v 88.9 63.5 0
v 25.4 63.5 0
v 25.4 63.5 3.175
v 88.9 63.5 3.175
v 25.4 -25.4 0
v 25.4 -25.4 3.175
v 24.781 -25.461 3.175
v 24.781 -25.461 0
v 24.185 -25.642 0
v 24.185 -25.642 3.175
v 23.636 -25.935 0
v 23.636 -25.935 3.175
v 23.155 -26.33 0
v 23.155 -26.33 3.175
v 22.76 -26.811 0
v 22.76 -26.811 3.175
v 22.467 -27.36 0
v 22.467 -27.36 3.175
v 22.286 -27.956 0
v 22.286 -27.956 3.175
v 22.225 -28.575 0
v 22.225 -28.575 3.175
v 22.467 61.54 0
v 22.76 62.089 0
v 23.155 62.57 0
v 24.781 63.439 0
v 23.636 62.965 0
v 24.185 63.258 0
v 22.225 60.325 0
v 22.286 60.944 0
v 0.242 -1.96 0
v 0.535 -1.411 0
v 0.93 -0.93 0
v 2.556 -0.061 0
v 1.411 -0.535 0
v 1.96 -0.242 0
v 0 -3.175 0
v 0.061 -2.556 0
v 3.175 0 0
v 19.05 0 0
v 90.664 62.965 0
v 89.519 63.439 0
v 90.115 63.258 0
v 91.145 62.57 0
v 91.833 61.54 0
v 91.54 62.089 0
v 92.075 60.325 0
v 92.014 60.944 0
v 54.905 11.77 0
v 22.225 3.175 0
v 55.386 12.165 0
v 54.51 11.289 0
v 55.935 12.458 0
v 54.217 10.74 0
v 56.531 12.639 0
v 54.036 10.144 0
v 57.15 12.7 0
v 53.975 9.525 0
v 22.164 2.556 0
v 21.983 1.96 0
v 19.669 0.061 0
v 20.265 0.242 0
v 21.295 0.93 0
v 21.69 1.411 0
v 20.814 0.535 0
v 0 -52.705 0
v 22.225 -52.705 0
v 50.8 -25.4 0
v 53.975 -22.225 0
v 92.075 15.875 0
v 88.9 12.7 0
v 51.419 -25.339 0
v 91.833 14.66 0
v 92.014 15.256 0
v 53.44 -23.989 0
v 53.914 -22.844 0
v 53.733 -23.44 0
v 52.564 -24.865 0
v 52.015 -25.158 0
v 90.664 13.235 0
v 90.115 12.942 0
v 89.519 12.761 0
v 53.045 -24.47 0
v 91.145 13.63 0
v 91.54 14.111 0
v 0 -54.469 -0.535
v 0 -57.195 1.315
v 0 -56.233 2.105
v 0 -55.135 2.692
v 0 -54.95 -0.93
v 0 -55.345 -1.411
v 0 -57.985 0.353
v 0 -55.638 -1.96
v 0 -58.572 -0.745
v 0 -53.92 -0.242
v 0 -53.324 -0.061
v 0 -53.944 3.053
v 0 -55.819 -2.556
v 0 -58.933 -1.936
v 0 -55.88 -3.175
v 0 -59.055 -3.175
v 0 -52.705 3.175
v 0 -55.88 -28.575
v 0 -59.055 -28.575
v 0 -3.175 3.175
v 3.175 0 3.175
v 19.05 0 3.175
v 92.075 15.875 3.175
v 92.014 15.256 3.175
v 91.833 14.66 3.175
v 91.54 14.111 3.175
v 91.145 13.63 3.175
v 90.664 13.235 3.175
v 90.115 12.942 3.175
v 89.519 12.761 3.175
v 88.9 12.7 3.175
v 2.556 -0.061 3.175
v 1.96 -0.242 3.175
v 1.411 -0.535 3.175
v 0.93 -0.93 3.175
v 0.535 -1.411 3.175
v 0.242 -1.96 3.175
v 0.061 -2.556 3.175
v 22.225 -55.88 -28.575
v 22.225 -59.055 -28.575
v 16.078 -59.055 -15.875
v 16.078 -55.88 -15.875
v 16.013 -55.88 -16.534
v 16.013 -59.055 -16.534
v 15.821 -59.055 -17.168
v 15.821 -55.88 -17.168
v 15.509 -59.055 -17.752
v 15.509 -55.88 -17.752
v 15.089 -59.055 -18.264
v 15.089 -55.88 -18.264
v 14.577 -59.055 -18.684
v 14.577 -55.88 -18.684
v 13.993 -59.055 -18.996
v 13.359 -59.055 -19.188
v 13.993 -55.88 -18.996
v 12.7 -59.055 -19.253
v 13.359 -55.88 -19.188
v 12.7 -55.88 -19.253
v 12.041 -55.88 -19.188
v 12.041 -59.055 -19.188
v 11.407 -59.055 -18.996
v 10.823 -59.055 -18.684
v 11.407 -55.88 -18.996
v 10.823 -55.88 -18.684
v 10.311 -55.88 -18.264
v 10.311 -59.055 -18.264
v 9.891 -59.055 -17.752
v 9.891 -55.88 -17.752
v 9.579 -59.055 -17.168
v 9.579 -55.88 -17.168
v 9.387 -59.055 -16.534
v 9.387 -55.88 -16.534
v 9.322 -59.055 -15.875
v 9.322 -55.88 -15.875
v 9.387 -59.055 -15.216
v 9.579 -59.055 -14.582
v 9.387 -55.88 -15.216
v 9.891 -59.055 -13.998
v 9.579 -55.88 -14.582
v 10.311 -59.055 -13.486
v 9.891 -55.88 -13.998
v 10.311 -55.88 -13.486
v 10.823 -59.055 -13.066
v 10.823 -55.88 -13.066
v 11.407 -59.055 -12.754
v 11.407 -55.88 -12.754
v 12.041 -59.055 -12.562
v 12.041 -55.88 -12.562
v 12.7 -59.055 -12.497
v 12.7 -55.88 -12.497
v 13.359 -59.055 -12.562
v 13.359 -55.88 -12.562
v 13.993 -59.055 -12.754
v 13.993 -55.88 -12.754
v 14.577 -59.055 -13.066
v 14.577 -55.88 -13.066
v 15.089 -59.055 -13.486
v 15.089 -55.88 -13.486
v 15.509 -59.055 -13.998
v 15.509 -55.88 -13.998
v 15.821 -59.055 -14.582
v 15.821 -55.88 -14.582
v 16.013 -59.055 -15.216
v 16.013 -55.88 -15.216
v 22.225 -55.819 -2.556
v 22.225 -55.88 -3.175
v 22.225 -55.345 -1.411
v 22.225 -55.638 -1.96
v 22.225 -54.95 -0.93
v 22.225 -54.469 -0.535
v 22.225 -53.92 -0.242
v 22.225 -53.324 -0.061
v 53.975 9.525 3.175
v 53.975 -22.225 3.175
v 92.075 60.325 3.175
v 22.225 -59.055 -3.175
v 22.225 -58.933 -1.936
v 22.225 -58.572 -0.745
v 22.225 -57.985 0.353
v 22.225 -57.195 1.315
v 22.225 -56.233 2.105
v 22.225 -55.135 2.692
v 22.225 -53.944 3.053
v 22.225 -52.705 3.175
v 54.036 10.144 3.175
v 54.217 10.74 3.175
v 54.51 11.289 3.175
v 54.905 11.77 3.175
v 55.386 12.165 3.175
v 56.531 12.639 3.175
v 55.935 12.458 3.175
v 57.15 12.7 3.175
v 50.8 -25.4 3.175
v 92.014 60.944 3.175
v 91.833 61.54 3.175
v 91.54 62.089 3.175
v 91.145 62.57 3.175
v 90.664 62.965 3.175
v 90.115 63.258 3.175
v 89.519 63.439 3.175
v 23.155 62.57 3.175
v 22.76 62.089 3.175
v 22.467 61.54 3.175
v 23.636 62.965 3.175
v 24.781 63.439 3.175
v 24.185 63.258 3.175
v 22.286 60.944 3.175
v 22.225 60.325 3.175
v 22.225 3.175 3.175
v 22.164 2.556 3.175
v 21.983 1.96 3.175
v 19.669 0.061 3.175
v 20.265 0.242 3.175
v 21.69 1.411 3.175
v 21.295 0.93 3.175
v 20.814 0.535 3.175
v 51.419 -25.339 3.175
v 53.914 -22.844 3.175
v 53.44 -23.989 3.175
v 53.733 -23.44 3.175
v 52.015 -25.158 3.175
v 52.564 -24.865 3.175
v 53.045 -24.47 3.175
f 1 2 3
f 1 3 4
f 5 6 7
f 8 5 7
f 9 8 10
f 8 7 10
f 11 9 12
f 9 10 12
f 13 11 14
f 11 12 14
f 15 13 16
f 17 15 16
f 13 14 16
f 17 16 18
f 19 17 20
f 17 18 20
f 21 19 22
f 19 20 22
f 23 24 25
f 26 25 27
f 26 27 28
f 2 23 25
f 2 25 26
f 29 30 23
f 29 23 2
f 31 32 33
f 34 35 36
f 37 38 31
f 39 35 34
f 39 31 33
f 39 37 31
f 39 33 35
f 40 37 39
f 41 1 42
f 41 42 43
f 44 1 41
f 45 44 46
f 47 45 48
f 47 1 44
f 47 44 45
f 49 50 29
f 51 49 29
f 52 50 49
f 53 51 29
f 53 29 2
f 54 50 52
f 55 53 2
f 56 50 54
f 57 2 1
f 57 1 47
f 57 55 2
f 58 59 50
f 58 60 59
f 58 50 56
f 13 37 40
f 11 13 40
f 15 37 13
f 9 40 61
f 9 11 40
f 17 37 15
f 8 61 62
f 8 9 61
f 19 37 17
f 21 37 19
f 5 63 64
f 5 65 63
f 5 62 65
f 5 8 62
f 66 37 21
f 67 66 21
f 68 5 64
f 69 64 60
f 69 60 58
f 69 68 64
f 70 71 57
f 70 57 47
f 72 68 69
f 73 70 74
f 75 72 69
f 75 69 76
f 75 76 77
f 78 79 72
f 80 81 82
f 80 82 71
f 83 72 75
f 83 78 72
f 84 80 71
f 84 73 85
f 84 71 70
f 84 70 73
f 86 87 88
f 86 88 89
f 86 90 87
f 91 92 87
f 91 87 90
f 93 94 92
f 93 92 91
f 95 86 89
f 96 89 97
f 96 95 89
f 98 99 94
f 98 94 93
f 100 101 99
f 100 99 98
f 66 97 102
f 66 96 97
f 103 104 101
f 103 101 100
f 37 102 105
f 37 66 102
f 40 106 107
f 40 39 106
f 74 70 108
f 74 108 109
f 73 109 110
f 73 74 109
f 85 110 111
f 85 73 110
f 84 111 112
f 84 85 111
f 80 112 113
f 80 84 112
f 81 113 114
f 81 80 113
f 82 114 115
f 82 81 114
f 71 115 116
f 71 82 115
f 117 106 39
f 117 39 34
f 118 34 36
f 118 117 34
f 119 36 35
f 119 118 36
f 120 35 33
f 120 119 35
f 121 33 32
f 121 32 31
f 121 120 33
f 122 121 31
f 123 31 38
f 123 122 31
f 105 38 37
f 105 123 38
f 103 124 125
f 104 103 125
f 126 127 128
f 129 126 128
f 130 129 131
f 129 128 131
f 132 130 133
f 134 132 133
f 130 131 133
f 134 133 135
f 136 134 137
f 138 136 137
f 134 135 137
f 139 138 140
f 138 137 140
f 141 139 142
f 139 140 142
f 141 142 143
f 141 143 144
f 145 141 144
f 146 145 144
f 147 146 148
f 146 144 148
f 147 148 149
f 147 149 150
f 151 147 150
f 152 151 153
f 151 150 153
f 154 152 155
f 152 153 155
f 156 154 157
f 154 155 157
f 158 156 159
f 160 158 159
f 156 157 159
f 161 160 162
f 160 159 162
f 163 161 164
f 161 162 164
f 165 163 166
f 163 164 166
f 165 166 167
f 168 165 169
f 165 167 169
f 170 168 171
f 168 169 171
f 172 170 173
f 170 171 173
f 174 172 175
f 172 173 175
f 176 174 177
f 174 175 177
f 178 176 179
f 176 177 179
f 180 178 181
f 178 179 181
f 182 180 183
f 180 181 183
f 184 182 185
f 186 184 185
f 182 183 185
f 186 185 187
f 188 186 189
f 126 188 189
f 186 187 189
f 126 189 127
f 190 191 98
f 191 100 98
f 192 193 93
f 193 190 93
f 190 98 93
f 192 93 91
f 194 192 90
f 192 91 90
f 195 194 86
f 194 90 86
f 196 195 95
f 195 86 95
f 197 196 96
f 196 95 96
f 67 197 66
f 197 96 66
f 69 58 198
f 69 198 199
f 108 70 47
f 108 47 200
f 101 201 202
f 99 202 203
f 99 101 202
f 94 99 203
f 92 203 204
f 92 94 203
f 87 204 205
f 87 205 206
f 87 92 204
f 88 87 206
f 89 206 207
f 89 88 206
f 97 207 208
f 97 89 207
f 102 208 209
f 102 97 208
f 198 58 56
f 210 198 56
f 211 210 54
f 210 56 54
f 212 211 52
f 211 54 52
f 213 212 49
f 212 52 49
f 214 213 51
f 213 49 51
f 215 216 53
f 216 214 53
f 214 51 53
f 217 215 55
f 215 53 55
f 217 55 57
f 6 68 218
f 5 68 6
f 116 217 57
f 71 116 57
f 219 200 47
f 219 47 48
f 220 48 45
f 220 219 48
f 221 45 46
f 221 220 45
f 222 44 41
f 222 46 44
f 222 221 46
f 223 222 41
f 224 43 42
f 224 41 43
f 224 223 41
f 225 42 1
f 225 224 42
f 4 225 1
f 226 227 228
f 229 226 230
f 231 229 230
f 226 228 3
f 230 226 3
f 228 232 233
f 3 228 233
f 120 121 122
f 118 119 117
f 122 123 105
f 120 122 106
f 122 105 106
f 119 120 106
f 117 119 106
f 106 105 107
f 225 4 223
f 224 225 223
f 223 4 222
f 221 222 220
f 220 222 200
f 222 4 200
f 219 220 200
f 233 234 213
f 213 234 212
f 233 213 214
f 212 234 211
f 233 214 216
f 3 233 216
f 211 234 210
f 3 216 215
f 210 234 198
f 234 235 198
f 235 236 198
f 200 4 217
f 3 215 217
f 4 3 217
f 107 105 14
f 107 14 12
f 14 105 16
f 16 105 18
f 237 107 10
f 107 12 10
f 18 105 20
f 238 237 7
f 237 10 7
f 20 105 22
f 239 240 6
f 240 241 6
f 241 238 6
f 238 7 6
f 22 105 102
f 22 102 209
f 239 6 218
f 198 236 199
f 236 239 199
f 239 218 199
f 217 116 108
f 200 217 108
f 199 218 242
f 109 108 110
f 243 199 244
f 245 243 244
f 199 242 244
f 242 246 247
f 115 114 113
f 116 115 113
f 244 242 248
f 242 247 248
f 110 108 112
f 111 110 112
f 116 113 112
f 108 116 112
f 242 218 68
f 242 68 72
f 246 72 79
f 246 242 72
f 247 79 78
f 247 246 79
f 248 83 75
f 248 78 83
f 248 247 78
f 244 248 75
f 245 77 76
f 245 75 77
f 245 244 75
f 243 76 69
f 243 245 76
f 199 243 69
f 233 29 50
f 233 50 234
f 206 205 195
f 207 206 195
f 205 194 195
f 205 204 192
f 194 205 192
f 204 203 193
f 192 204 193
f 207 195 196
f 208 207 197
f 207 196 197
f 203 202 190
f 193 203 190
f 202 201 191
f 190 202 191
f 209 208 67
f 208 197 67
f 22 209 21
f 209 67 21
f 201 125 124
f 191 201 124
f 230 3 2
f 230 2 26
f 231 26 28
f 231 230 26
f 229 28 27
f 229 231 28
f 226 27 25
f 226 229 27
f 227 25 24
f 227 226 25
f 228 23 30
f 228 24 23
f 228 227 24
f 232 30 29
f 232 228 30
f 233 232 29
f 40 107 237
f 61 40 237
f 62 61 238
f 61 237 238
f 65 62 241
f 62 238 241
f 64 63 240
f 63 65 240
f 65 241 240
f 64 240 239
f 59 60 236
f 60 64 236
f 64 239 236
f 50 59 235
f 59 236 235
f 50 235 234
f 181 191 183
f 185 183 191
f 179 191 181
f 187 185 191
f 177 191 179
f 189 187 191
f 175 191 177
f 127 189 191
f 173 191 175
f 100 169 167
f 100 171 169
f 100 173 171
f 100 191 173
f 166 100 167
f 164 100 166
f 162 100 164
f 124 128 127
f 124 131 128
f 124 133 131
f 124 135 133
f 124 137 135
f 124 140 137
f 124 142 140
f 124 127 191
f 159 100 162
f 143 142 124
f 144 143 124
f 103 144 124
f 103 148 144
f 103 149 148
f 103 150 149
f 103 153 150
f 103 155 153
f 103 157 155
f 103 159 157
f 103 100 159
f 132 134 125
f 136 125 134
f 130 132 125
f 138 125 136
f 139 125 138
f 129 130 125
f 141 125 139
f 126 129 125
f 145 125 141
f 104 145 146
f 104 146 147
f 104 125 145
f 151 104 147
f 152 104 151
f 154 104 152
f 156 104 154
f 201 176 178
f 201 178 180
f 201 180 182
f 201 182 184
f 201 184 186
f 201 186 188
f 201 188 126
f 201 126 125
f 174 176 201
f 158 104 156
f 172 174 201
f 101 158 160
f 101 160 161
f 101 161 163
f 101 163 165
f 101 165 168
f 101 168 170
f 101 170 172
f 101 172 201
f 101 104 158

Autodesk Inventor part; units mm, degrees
ref_plane "YZ Plane" through (0, 0, 0) normal (1, 0, 0) x (0, 1, 0)
ref_plane "XZ Plane" through (0, 0, 0) normal (0, 1, 0) x (-1, 0, 0)
ref_plane "XY Plane" through (0, 0, 0) normal (0, 0, 1) x (1, 0, 0)
sketch "Sketch1 outline for Plate1" plane through (0, 0, 0) normal (0, 0, 1) x (1, 0, 0)
  line L0 (53.975, 44.45) -> (53.975, 19.05)
  line L1 (53.975, 19.05) -> (53.975, -25.4)
  line L2 (53.975, -25.4) -> (22.225, -25.4)
  line L3 (22.225, -25.4) -> (22.225, -59.055)
  line L4 (22.225, -59.055) -> (0, -59.055)
  line L5 (0, -59.055) -> (0, 0)
  line L6 (0, 0) -> (22.225, 0)
  line L7 (22.225, 0) -> (22.225, 50.8)
  line L8 (22.225, 50.8) -> (47.625, 50.8)
  line L9 (47.625, 50.8) -> (53.975, 50.8)
  line L10 (53.975, 50.8) -> (53.975, 44.45)
extrude "Plate1" add sketch "Sketch1 outline for Plate1" along normal blind 3.175
sketch "Sketch2" plane through (0, -55.88, 3.175) normal (0, -1, 0) x (1, 0, 0)
  line L0 (22.225, 0) -> (0, 0)
  line L1 (0, 0) -> (0, -31.75)
  line L2 (0, -31.75) -> (22.225, -31.75)
  line L3 (22.225, -31.75) -> (22.225, 0)
edge flange "Flange1" height 31.75 angle 90 thickness 3.175 bend radius 3.175 thickness toward (0, -1, 0) relief straight relief width 3.175 relief depth 1.5875 edges at (11.1125, -59.055, 0) wall of the first edge with corners at (22.225, -55.88, 3.175) (0, -55.88, 3.175) (0, -55.88, -28.575) (22.225, -55.88, -28.575)
bend "Bend1"
corner "Corner1"
sketch "Sketch3" plane through (0, -55.88, -28.575) normal (0, 1, 0) x (1, 0, 0)
  circle A0 centre (12.7, -12.7) radius 3.3782 projected
  point P0 (0, -28.575)
extrude "Cut1" cut sketch "Sketch3" against normal blind 3.175
sketch "Sketch1" plane through (0, 0, 0) normal (0, 0, 1) x (1, 0, 0)
  line L0 (0, 0) -> (82.111681, 0)
  line L1 (56.711681, -22.225) -> (0, -22.225)
  line L2 (85.286681, -3.175) -> (85.286681, -19.05)
  line L3 (29.00734, 0) -> (29.00734, -1.5875)
  line L4 (29.00734, -1.5875) -> (28.21359, -1.5875)
  line L5 (29.00734, -1.5875) -> (29.80109, -1.5875)
  line L6 (29.80109, -1.5875) -> (29.80109, 0)
  line L7 (28.21359, -1.5875) -> (28.21359, 0)
  line L8 (29.80109, -22.225) -> (29.80109, -20.6375)
  line L9 (29.80109, -20.6375) -> (28.21359, -20.6375)
  line L10 (28.21359, -20.6375) -> (28.21359, -22.225)
sketch "Sketch5" plane through (53.975, -25.4, 0) normal (1, 0, 0) x (0, 0, -1)
  line L0 (-3.175, 76.2) -> (-3.175, 0) projected
  line L1 (0, 76.2) -> (0, 0) projected
  line L2 (0, 76.2) -> (-3.175, 76.2) projected
  line L3 (-3.175, 76.2) -> (-3.175, 38.1)
  line L4 (-3.175, 38.1) -> (0, 38.1)
  point P0 (0, 25.4)
  dimension "d13" = 38.1
extrude "Extrusion1" add sketch "Sketch5" along normal blind 38.1
sketch "Sketch6" plane through (22.225, 50.8, 3.175) normal (0, 1, 0) x (1, 0, 0)
  line L0 (0, 0) -> (69.85, 0) projected
  line L1 (69.85, 3.175) -> (69.85, 0) projected
  line L2 (0, 3.175) -> (69.85, 3.175) projected
  line L3 (0, 3.175) -> (0, 0) projected
  point P0 (-22.225, 3.175)
extrude "Extrusion2" add sketch "Sketch6" along normal blind 12.7
fillet "Fillet2" radius 3.175 8 edges at (22.225, 63.5, 1.5875) (92.075, 63.5, 1.5875) (22.225, 0, 1.5875) (0, 0, 1.5875) (92.075, 12.7, 1.5875) (53.975, 12.7, 1.5875) (53.975, -25.4, 1.5875) (22.225, -25.4, 1.5875)
equation "\"d1\" = BendReliefWidth"
equation "\"d2\" = BendReliefDepth"
equation "\"d3\" = MinimumRemnant"
equation "\"d4\" = BendRadius"
equation "\"d7\" = BendRadius"
equation "\"d8\" = CornerReliefSize"
equation "\"d9\" = GapSize"
equation "\"d10\" = JacobiRadiusSize"
equation "\"BendRadius\" = Thickness"
equation "\"BendReliefWidth\" = Thickness"
equation "\"BendReliefDepth\" = 0.5 * Thickness"
equation "\"CornerReliefSize\" = 4 * Thickness"
equation "\"MinimumRemnant\" = 2 * Thickness"
equation "\"TransitionRadius\" = BendRadius"
equation "\"JacobiRadiusSize\" = Thickness"
equation "\"GapSize\" = Thickness"
equation "\"d0\" = BendRadius"
equation "\"d4\" = Thickness"
equation "\"Thickness\" = 3.175"
properties part number "cylinder mount" material "Aluminum 6061"
